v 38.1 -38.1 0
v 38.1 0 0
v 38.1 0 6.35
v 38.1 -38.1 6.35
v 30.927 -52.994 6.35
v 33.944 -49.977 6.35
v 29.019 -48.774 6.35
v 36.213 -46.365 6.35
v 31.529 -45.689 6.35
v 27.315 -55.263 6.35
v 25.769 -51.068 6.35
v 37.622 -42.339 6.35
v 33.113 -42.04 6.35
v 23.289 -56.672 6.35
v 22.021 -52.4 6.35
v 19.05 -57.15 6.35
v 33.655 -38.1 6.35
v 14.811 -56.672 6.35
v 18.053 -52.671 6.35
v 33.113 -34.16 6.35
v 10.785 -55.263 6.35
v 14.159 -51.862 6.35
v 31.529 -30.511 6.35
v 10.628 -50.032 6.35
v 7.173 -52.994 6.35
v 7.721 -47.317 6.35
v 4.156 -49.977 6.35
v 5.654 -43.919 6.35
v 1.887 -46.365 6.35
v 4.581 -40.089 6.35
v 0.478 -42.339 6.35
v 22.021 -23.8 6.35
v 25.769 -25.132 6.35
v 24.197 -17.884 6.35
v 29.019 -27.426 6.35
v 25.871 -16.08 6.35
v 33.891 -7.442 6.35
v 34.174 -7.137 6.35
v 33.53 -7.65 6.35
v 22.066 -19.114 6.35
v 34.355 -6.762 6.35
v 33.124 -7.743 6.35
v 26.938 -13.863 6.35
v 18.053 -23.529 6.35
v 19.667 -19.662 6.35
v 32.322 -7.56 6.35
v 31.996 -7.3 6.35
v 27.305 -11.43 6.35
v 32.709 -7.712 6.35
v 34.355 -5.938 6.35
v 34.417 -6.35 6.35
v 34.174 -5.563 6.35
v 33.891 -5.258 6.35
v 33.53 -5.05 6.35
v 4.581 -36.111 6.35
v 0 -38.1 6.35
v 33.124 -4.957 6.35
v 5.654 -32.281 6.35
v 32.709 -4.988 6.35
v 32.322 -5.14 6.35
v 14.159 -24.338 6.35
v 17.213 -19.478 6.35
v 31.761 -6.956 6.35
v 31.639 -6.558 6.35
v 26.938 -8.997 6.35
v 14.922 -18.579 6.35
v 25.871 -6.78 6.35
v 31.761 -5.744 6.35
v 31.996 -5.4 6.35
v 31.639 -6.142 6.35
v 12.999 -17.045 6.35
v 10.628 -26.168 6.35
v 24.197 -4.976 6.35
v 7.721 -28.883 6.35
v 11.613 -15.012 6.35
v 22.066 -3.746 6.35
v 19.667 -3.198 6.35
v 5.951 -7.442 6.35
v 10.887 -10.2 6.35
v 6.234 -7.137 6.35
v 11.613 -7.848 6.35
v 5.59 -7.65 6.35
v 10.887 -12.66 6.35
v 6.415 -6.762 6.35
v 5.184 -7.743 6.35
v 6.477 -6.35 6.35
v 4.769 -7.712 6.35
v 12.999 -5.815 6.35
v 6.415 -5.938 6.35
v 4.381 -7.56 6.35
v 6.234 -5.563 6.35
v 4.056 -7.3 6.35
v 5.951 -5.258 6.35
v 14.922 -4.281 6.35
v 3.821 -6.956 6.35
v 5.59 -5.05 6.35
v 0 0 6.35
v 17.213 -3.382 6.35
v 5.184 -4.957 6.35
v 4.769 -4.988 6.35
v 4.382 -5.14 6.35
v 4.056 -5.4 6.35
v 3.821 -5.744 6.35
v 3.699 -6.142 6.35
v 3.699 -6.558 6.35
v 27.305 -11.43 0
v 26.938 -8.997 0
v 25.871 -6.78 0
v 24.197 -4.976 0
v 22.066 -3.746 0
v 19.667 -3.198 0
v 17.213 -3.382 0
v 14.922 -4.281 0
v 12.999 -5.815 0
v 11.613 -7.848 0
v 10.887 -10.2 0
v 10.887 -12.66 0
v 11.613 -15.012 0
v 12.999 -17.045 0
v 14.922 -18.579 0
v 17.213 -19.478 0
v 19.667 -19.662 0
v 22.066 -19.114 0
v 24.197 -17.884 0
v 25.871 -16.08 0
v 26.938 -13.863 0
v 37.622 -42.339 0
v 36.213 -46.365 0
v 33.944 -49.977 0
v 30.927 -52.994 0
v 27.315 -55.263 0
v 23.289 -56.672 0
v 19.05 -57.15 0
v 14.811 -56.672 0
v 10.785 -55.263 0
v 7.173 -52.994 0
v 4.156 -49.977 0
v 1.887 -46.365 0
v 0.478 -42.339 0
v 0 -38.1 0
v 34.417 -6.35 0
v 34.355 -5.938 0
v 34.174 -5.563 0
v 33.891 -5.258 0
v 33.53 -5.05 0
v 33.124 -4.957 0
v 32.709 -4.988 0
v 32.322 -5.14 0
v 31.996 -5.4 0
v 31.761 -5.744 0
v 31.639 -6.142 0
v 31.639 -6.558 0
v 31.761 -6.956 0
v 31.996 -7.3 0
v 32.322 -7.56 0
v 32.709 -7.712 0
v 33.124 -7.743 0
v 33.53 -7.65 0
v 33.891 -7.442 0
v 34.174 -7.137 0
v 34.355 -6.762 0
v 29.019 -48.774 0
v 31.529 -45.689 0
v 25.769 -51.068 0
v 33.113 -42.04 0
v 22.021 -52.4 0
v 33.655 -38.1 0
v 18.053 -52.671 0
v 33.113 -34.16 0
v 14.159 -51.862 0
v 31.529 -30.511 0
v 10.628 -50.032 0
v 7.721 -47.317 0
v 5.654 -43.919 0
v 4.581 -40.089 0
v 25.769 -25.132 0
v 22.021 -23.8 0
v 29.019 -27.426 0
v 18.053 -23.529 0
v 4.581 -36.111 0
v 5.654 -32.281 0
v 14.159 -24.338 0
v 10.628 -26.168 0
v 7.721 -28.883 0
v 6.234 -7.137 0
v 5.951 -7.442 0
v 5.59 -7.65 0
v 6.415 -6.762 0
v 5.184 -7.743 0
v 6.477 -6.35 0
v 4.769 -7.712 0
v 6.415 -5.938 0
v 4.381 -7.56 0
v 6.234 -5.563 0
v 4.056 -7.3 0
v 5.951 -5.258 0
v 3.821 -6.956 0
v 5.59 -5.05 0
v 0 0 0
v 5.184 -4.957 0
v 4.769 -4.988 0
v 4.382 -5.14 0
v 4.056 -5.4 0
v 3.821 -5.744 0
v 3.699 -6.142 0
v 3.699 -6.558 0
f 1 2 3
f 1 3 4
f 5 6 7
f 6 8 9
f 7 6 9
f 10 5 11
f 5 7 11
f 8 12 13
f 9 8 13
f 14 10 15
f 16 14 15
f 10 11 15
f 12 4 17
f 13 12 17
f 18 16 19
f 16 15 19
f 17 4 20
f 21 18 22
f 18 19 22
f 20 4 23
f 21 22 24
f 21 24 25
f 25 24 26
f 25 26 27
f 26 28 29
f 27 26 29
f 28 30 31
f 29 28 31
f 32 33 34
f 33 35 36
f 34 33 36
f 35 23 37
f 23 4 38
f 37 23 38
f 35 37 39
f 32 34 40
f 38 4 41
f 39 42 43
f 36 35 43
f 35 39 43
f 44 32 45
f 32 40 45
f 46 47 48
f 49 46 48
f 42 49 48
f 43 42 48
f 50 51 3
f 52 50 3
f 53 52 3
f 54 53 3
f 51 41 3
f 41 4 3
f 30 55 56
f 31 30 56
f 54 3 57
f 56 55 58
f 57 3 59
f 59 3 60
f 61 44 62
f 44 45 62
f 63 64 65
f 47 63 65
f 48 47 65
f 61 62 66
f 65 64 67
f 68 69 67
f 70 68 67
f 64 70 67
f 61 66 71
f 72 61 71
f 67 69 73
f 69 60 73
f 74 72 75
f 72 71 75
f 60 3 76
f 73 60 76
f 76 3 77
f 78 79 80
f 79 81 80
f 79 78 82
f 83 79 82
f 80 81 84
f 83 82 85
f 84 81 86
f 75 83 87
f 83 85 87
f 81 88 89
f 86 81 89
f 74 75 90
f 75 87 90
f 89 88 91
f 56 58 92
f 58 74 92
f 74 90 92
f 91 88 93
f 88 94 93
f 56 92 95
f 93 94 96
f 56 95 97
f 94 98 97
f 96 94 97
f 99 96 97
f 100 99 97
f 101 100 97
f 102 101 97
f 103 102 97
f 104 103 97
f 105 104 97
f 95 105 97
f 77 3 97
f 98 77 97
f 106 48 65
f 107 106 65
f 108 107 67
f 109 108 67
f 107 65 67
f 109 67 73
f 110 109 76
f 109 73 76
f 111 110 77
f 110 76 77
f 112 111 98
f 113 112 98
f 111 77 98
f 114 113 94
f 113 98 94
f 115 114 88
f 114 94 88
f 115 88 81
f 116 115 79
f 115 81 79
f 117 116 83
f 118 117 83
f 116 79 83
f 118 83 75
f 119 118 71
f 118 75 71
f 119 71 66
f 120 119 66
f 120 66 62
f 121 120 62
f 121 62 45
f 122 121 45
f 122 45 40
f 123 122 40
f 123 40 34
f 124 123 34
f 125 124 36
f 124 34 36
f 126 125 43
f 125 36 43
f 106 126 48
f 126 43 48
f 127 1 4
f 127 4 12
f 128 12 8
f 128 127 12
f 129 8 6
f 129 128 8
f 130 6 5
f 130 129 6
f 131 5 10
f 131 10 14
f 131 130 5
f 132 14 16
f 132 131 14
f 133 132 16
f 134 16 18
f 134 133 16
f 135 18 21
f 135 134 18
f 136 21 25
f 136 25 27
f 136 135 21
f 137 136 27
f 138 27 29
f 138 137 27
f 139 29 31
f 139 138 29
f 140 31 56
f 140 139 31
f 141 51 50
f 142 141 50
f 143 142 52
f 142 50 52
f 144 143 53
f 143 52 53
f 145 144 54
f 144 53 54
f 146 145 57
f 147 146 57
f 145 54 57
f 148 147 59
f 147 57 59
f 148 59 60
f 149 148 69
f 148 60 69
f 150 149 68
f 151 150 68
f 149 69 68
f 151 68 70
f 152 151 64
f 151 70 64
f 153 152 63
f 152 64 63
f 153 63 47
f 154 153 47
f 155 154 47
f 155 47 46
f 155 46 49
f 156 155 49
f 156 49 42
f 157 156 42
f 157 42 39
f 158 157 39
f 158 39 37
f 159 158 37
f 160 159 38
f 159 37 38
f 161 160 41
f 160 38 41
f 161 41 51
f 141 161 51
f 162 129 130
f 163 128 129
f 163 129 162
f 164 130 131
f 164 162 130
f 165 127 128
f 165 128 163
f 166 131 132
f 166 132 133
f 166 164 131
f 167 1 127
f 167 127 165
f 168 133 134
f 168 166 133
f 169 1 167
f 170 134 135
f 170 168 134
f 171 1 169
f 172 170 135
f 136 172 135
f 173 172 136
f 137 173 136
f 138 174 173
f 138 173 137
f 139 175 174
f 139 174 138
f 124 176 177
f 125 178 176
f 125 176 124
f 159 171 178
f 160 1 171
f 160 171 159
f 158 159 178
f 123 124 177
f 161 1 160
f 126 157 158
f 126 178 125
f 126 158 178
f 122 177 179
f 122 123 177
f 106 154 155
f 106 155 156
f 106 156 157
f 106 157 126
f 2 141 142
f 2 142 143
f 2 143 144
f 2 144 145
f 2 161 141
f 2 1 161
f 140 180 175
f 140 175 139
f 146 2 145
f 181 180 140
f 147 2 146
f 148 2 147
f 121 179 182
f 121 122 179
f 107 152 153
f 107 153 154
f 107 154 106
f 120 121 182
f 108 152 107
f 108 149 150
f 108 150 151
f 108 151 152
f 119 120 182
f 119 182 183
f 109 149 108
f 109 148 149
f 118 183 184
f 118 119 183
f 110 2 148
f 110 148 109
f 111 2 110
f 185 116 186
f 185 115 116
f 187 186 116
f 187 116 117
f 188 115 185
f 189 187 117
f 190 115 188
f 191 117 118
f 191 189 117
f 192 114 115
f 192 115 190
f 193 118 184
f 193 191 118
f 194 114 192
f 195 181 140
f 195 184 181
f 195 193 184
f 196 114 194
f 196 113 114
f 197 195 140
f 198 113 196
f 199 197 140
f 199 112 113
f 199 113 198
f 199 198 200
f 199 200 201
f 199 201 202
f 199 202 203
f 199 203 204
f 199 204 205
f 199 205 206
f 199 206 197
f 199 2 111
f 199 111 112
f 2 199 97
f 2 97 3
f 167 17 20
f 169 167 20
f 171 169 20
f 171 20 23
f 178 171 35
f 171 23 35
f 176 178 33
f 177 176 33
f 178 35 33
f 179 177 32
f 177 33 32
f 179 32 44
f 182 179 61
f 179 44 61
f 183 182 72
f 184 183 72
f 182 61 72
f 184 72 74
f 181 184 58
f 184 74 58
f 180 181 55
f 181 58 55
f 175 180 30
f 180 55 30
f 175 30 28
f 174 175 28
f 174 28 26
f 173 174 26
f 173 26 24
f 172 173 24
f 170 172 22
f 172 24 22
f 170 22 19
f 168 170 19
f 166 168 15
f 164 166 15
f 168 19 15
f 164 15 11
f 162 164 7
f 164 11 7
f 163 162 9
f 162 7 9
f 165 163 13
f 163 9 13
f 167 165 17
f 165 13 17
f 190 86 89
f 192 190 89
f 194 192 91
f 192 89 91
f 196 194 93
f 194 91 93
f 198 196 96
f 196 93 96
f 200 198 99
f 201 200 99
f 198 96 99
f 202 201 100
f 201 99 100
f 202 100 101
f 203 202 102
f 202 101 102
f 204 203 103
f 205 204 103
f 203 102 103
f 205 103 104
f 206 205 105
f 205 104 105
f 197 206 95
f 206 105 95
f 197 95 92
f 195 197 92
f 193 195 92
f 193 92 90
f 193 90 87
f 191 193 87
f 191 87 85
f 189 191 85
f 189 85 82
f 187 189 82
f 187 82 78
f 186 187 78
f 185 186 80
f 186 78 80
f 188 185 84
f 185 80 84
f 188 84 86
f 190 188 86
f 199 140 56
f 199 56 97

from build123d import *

# Parameters (mm, degrees)
BOSS_EXTRUDE1_DEPTH = 6.35
SKETCH2_R           = 14.605
CUT_EXTRUDE3_DEPTH  = 6.35
SKETCH3_R           = 8.255
CUT_EXTRUDE4_DEPTH  = 6.35
SKETCH5_R           = 1.397
CUT_EXTRUDE5_DEPTH  = 6.35


with BuildPart() as part:
    # Sketch1 → Boss-Extrude1 (new body)
    with BuildSketch(Plane.XY):
        with BuildLine():
            Line((0, 0), (38.1, 0))
            Line((38.1, 0), (38.1, -38.1))
            ThreePointArc((38.1, -38.1), (19.05, -57.15), (0, -38.1))
            Line((0, -38.1), (0, 0))
        make_face()
    extrude(amount=BOSS_EXTRUDE1_DEPTH)

    # Sketch2 → Cut-Extrude3 (cut)
    with BuildSketch(Plane.XY.offset(6.35)):
        with Locations((19.05, -38.1)):
            Circle(SKETCH2_R)
    extrude(amount=-CUT_EXTRUDE3_DEPTH, mode=Mode.SUBTRACT)

    # Sketch3 → Cut-Extrude4 (cut)
    with BuildSketch(Plane.XY.offset(6.35)):
        with Locations((19.05, -11.43)):
            Circle(SKETCH3_R)
    extrude(amount=-CUT_EXTRUDE4_DEPTH, mode=Mode.SUBTRACT)

    # Sketch5 → Cut-Extrude5 (cut)
    with BuildSketch(Plane.XY.offset(6.35)):
        with Locations((5.08, -6.35)):
            Circle(SKETCH5_R)
        with Locations((33.02, -6.35)):
            Circle(SKETCH5_R)
    extrude(amount=-CUT_EXTRUDE5_DEPTH, mode=Mode.SUBTRACT)


solid = part.part
